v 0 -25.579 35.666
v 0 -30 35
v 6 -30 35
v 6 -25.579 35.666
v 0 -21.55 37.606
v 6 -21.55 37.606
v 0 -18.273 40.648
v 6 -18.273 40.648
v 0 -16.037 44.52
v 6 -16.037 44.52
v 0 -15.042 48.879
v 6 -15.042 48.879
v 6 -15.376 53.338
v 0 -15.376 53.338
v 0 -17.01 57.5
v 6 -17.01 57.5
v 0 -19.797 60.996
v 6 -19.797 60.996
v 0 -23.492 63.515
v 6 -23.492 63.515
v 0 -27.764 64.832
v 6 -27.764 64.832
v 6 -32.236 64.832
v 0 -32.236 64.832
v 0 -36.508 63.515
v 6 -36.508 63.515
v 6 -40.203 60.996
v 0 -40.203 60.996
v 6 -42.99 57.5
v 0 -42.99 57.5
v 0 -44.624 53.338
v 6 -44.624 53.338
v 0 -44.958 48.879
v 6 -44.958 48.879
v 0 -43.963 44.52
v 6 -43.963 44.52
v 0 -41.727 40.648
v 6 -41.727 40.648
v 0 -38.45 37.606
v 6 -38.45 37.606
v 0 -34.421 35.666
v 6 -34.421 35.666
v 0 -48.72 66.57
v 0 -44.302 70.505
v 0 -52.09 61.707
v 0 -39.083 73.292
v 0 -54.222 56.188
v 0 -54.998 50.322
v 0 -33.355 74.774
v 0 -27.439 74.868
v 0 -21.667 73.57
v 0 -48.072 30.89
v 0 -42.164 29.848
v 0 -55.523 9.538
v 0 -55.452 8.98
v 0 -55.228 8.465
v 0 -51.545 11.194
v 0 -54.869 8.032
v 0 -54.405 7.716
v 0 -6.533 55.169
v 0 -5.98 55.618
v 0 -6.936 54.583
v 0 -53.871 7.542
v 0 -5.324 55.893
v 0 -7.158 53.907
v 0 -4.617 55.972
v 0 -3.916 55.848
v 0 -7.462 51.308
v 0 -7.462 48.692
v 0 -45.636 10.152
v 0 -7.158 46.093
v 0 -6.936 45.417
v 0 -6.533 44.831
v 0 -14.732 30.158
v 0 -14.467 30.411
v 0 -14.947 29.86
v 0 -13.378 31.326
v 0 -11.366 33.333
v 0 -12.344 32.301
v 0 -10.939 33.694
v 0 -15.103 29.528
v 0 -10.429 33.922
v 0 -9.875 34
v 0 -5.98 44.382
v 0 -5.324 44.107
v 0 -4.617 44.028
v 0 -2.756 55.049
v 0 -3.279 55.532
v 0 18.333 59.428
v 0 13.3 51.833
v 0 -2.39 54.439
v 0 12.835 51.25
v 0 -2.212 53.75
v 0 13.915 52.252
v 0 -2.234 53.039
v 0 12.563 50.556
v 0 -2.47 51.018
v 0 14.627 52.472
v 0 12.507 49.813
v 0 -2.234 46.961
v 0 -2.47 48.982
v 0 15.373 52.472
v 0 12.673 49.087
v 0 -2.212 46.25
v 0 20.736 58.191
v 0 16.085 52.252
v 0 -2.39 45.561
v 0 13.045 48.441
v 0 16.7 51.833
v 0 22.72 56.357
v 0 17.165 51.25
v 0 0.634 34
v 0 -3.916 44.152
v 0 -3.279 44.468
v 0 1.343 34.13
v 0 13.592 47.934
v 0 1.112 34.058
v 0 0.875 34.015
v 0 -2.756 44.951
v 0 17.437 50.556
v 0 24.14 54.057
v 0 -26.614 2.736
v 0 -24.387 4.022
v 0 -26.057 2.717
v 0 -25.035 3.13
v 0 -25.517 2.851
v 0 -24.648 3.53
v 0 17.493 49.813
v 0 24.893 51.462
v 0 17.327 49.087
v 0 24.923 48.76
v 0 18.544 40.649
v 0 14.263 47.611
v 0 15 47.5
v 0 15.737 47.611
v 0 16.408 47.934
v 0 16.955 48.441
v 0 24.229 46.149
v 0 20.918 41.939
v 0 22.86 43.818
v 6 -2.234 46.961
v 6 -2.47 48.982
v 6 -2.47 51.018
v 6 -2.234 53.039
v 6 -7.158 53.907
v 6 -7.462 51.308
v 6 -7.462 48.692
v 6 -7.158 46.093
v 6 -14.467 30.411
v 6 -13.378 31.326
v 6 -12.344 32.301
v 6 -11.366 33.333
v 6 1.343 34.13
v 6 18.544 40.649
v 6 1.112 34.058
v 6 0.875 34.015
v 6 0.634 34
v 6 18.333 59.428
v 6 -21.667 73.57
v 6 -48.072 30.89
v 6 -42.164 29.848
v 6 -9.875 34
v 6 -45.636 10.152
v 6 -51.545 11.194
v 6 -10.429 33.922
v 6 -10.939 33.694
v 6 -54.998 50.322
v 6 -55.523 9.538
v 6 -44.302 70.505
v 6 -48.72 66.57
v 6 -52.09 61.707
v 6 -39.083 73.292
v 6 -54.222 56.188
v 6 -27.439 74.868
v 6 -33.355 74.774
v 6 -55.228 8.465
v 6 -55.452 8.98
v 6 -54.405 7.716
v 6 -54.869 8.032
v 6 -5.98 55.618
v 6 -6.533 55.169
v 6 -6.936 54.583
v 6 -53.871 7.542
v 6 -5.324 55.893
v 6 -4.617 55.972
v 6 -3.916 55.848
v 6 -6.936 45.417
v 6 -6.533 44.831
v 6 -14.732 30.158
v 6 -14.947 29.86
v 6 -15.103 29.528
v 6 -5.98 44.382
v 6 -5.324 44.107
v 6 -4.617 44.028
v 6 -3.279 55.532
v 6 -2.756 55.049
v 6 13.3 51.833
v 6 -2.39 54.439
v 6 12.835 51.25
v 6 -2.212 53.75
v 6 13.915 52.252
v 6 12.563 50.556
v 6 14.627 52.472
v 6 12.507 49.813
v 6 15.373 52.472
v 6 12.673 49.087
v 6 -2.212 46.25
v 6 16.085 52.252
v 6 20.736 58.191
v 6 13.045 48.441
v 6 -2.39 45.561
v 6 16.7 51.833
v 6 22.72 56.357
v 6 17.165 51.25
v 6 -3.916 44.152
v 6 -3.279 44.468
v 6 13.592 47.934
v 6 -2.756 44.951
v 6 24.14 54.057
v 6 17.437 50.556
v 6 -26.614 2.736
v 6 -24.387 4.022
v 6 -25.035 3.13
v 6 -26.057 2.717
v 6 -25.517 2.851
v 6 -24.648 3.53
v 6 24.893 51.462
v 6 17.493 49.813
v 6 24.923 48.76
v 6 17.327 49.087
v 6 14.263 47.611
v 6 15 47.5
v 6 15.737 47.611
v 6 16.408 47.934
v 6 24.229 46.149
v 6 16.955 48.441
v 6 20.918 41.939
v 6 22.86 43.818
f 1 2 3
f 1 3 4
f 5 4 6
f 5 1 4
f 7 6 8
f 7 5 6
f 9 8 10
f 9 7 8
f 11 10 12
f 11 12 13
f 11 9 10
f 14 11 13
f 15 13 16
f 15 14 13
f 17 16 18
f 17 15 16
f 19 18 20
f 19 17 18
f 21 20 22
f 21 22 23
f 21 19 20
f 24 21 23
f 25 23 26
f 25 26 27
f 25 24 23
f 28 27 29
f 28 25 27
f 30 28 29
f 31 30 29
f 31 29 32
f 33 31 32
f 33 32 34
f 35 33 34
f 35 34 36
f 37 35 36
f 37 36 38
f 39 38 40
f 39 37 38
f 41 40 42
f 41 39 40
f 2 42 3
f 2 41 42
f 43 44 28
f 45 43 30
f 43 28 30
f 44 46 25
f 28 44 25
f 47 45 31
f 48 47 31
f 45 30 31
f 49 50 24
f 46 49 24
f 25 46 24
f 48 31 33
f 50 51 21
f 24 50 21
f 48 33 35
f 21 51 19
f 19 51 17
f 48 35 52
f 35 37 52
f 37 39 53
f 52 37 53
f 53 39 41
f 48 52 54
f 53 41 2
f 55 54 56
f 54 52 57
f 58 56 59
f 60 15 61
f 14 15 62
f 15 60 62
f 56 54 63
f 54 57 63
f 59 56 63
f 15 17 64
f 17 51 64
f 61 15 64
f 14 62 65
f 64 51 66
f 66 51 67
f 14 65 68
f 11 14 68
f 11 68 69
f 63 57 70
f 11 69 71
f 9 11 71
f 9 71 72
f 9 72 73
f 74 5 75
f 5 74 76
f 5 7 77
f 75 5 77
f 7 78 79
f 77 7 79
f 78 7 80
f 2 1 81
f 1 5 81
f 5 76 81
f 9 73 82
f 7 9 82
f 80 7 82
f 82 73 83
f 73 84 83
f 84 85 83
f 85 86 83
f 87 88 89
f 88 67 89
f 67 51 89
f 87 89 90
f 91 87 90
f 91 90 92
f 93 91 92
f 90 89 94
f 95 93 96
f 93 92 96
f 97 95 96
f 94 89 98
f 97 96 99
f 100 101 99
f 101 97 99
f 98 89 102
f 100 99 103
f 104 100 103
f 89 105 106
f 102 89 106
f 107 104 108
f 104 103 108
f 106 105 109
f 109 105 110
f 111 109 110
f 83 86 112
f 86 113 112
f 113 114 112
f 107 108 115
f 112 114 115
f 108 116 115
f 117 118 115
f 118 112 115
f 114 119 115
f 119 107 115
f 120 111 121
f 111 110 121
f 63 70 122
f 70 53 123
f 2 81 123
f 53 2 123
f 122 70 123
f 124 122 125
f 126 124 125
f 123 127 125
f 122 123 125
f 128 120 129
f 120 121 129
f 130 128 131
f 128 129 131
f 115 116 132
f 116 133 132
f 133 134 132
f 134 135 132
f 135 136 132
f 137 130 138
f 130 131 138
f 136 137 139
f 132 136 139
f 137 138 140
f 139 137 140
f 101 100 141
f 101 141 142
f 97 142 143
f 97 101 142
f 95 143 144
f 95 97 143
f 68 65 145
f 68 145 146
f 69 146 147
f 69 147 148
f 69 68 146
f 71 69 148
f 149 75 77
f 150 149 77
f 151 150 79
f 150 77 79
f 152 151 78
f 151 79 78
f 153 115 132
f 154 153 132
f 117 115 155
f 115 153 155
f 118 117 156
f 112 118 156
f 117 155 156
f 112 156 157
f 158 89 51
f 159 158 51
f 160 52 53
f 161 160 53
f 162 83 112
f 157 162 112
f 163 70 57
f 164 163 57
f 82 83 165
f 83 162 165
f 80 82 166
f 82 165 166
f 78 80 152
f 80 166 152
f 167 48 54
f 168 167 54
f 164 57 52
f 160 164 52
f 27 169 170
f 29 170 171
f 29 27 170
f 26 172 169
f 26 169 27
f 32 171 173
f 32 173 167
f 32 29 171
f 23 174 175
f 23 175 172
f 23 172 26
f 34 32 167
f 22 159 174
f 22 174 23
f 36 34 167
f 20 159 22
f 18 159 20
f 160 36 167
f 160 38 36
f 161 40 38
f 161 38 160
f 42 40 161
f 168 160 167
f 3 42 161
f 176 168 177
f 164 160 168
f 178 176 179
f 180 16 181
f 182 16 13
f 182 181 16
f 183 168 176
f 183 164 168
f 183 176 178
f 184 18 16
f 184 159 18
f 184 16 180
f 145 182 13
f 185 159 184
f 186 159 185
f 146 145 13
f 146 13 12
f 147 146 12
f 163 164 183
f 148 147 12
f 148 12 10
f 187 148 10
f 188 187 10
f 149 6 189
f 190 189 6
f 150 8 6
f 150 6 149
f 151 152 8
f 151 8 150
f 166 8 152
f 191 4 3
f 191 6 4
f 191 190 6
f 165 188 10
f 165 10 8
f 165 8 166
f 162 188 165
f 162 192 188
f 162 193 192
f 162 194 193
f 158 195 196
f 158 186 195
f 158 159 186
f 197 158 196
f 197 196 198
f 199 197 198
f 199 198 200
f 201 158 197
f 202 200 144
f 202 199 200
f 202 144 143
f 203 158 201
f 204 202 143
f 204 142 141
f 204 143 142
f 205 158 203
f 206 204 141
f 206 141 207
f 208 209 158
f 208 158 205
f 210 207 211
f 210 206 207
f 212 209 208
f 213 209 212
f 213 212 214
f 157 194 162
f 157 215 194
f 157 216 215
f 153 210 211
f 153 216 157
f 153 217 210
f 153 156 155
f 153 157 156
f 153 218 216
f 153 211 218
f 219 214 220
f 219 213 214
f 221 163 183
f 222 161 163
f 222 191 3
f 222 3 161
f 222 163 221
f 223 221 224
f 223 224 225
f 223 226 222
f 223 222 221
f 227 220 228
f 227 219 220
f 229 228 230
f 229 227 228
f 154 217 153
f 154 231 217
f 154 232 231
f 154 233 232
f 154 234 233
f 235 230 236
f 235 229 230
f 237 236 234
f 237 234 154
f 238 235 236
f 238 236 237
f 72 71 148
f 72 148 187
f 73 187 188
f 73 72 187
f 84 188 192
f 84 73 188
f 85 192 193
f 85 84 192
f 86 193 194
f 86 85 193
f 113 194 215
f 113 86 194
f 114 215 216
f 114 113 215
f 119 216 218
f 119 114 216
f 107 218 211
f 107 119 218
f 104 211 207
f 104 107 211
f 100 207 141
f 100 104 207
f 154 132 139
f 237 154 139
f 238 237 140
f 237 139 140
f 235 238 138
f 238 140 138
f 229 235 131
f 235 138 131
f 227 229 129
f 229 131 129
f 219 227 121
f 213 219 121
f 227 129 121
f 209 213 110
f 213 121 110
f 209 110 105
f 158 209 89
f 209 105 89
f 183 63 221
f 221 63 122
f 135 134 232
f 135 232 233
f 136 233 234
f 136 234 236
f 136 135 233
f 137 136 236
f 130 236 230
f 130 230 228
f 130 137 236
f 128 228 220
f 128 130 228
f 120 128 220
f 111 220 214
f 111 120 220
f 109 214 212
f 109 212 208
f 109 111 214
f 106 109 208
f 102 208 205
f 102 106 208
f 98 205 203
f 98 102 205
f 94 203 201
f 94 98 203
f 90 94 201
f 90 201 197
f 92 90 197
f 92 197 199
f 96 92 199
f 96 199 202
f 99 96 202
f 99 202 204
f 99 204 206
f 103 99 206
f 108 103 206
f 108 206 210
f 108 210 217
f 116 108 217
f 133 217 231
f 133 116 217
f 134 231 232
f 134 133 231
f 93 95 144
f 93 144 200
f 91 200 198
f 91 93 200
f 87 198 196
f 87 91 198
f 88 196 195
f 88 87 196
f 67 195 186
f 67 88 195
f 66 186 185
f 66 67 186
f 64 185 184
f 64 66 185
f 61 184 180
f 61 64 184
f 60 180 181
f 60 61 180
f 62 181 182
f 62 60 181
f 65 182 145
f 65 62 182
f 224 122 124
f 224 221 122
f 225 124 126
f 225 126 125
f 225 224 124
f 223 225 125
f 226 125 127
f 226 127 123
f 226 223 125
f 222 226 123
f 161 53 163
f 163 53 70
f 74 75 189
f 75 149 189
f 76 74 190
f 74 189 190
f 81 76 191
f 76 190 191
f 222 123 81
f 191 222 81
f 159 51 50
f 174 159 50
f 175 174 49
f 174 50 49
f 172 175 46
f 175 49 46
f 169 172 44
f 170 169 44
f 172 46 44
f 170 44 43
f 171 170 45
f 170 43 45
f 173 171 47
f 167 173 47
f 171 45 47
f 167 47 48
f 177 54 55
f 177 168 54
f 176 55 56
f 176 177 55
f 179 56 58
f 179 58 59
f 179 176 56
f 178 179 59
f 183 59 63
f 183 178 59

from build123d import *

# Parameters (mm, degrees)
SKETCH1_R           = 15
SKETCH1_R_2         = 2.5
BOSS_EXTRUDE1_DEPTH = 6
FILLET1_R           = 2


with BuildPart() as part:
    # Sketch1 → Boss-Extrude1 (new body)
    with BuildSketch(Plane(origin=(0, 0, 0), x_dir=(0, 0, -1), z_dir=(1, 0, 0))):
        with BuildLine():
            Line((-59.428090416, 18.333333333), (-73.57022604, -21.666666667))
            ThreePointArc((-73.57022604, -21.666666667), (-70.504972651, -44.301961285), (-50.322091296, -54.997925058))
            Line((-50.322091296, -54.997925058), (-7.837413011, -55.545328295))
            Line((-7.837413011, -55.545328295), (-2.444575303, -24.961025846))
            Line((-2.444575303, -24.961025846), (-30.070966116, -14.905841909))
            ThreePointArc((-30.070966116, -14.905841909), (-31.918030616, -12.736095946), (-34, -10.790627288))
            Line((-34, -10.790627288), (-34, 1))
            Line((-34, 1), (-40.649042421, 18.543951518))
            ThreePointArc((-40.649042421, 18.543951518), (-50.11214889, 24.999371112), (-59.428090416, 18.333333333))
        make_face()
        with Locations((-50, -30)):
            Circle(SKETCH1_R, mode=Mode.SUBTRACT)
        with Locations((-50, 15)):
            Circle(SKETCH1_R_2, mode=Mode.SUBTRACT)
        Polygon((-29.84807753, -42.163518223), (-10.15192247, -45.636481777), (-11.193811536, -51.545328295), (-30.889966596, -48.072364741), align=None, mode=Mode.SUBTRACT)
        with BuildLine():
            ThreePointArc((-53.038843109, -2.234135678), (-55.934982936, -4.262034616), (-53.907083998, -7.158174443))
            ThreePointArc((-53.907083998, -7.158174443), (-50, -7.5), (-46.092916002, -7.158174443))
            ThreePointArc((-46.092916002, -7.158174443), (-44.065017064, -4.262034616), (-46.961156891, -2.234135678))
            ThreePointArc((-46.961156891, -2.234135678), (-50, -2.5), (-53.038843109, -2.234135678))
        make_face(mode=Mode.SUBTRACT)
    extrude(amount=BOSS_EXTRUDE1_DEPTH)

    # Fillet1
    fillet1_edges = [part.edges().sort_by_distance(p)[0] for p in [
        (3, -14.905841909, 30.070966116),
        (3, -24.961025846, 2.444575303),
        (3, -55.545328295, 7.837413011),
        (3, 1, 34),
        (3, -10.790627288, 34),
    ]]
    fillet(fillet1_edges, radius=FILLET1_R)


solid = part.part
